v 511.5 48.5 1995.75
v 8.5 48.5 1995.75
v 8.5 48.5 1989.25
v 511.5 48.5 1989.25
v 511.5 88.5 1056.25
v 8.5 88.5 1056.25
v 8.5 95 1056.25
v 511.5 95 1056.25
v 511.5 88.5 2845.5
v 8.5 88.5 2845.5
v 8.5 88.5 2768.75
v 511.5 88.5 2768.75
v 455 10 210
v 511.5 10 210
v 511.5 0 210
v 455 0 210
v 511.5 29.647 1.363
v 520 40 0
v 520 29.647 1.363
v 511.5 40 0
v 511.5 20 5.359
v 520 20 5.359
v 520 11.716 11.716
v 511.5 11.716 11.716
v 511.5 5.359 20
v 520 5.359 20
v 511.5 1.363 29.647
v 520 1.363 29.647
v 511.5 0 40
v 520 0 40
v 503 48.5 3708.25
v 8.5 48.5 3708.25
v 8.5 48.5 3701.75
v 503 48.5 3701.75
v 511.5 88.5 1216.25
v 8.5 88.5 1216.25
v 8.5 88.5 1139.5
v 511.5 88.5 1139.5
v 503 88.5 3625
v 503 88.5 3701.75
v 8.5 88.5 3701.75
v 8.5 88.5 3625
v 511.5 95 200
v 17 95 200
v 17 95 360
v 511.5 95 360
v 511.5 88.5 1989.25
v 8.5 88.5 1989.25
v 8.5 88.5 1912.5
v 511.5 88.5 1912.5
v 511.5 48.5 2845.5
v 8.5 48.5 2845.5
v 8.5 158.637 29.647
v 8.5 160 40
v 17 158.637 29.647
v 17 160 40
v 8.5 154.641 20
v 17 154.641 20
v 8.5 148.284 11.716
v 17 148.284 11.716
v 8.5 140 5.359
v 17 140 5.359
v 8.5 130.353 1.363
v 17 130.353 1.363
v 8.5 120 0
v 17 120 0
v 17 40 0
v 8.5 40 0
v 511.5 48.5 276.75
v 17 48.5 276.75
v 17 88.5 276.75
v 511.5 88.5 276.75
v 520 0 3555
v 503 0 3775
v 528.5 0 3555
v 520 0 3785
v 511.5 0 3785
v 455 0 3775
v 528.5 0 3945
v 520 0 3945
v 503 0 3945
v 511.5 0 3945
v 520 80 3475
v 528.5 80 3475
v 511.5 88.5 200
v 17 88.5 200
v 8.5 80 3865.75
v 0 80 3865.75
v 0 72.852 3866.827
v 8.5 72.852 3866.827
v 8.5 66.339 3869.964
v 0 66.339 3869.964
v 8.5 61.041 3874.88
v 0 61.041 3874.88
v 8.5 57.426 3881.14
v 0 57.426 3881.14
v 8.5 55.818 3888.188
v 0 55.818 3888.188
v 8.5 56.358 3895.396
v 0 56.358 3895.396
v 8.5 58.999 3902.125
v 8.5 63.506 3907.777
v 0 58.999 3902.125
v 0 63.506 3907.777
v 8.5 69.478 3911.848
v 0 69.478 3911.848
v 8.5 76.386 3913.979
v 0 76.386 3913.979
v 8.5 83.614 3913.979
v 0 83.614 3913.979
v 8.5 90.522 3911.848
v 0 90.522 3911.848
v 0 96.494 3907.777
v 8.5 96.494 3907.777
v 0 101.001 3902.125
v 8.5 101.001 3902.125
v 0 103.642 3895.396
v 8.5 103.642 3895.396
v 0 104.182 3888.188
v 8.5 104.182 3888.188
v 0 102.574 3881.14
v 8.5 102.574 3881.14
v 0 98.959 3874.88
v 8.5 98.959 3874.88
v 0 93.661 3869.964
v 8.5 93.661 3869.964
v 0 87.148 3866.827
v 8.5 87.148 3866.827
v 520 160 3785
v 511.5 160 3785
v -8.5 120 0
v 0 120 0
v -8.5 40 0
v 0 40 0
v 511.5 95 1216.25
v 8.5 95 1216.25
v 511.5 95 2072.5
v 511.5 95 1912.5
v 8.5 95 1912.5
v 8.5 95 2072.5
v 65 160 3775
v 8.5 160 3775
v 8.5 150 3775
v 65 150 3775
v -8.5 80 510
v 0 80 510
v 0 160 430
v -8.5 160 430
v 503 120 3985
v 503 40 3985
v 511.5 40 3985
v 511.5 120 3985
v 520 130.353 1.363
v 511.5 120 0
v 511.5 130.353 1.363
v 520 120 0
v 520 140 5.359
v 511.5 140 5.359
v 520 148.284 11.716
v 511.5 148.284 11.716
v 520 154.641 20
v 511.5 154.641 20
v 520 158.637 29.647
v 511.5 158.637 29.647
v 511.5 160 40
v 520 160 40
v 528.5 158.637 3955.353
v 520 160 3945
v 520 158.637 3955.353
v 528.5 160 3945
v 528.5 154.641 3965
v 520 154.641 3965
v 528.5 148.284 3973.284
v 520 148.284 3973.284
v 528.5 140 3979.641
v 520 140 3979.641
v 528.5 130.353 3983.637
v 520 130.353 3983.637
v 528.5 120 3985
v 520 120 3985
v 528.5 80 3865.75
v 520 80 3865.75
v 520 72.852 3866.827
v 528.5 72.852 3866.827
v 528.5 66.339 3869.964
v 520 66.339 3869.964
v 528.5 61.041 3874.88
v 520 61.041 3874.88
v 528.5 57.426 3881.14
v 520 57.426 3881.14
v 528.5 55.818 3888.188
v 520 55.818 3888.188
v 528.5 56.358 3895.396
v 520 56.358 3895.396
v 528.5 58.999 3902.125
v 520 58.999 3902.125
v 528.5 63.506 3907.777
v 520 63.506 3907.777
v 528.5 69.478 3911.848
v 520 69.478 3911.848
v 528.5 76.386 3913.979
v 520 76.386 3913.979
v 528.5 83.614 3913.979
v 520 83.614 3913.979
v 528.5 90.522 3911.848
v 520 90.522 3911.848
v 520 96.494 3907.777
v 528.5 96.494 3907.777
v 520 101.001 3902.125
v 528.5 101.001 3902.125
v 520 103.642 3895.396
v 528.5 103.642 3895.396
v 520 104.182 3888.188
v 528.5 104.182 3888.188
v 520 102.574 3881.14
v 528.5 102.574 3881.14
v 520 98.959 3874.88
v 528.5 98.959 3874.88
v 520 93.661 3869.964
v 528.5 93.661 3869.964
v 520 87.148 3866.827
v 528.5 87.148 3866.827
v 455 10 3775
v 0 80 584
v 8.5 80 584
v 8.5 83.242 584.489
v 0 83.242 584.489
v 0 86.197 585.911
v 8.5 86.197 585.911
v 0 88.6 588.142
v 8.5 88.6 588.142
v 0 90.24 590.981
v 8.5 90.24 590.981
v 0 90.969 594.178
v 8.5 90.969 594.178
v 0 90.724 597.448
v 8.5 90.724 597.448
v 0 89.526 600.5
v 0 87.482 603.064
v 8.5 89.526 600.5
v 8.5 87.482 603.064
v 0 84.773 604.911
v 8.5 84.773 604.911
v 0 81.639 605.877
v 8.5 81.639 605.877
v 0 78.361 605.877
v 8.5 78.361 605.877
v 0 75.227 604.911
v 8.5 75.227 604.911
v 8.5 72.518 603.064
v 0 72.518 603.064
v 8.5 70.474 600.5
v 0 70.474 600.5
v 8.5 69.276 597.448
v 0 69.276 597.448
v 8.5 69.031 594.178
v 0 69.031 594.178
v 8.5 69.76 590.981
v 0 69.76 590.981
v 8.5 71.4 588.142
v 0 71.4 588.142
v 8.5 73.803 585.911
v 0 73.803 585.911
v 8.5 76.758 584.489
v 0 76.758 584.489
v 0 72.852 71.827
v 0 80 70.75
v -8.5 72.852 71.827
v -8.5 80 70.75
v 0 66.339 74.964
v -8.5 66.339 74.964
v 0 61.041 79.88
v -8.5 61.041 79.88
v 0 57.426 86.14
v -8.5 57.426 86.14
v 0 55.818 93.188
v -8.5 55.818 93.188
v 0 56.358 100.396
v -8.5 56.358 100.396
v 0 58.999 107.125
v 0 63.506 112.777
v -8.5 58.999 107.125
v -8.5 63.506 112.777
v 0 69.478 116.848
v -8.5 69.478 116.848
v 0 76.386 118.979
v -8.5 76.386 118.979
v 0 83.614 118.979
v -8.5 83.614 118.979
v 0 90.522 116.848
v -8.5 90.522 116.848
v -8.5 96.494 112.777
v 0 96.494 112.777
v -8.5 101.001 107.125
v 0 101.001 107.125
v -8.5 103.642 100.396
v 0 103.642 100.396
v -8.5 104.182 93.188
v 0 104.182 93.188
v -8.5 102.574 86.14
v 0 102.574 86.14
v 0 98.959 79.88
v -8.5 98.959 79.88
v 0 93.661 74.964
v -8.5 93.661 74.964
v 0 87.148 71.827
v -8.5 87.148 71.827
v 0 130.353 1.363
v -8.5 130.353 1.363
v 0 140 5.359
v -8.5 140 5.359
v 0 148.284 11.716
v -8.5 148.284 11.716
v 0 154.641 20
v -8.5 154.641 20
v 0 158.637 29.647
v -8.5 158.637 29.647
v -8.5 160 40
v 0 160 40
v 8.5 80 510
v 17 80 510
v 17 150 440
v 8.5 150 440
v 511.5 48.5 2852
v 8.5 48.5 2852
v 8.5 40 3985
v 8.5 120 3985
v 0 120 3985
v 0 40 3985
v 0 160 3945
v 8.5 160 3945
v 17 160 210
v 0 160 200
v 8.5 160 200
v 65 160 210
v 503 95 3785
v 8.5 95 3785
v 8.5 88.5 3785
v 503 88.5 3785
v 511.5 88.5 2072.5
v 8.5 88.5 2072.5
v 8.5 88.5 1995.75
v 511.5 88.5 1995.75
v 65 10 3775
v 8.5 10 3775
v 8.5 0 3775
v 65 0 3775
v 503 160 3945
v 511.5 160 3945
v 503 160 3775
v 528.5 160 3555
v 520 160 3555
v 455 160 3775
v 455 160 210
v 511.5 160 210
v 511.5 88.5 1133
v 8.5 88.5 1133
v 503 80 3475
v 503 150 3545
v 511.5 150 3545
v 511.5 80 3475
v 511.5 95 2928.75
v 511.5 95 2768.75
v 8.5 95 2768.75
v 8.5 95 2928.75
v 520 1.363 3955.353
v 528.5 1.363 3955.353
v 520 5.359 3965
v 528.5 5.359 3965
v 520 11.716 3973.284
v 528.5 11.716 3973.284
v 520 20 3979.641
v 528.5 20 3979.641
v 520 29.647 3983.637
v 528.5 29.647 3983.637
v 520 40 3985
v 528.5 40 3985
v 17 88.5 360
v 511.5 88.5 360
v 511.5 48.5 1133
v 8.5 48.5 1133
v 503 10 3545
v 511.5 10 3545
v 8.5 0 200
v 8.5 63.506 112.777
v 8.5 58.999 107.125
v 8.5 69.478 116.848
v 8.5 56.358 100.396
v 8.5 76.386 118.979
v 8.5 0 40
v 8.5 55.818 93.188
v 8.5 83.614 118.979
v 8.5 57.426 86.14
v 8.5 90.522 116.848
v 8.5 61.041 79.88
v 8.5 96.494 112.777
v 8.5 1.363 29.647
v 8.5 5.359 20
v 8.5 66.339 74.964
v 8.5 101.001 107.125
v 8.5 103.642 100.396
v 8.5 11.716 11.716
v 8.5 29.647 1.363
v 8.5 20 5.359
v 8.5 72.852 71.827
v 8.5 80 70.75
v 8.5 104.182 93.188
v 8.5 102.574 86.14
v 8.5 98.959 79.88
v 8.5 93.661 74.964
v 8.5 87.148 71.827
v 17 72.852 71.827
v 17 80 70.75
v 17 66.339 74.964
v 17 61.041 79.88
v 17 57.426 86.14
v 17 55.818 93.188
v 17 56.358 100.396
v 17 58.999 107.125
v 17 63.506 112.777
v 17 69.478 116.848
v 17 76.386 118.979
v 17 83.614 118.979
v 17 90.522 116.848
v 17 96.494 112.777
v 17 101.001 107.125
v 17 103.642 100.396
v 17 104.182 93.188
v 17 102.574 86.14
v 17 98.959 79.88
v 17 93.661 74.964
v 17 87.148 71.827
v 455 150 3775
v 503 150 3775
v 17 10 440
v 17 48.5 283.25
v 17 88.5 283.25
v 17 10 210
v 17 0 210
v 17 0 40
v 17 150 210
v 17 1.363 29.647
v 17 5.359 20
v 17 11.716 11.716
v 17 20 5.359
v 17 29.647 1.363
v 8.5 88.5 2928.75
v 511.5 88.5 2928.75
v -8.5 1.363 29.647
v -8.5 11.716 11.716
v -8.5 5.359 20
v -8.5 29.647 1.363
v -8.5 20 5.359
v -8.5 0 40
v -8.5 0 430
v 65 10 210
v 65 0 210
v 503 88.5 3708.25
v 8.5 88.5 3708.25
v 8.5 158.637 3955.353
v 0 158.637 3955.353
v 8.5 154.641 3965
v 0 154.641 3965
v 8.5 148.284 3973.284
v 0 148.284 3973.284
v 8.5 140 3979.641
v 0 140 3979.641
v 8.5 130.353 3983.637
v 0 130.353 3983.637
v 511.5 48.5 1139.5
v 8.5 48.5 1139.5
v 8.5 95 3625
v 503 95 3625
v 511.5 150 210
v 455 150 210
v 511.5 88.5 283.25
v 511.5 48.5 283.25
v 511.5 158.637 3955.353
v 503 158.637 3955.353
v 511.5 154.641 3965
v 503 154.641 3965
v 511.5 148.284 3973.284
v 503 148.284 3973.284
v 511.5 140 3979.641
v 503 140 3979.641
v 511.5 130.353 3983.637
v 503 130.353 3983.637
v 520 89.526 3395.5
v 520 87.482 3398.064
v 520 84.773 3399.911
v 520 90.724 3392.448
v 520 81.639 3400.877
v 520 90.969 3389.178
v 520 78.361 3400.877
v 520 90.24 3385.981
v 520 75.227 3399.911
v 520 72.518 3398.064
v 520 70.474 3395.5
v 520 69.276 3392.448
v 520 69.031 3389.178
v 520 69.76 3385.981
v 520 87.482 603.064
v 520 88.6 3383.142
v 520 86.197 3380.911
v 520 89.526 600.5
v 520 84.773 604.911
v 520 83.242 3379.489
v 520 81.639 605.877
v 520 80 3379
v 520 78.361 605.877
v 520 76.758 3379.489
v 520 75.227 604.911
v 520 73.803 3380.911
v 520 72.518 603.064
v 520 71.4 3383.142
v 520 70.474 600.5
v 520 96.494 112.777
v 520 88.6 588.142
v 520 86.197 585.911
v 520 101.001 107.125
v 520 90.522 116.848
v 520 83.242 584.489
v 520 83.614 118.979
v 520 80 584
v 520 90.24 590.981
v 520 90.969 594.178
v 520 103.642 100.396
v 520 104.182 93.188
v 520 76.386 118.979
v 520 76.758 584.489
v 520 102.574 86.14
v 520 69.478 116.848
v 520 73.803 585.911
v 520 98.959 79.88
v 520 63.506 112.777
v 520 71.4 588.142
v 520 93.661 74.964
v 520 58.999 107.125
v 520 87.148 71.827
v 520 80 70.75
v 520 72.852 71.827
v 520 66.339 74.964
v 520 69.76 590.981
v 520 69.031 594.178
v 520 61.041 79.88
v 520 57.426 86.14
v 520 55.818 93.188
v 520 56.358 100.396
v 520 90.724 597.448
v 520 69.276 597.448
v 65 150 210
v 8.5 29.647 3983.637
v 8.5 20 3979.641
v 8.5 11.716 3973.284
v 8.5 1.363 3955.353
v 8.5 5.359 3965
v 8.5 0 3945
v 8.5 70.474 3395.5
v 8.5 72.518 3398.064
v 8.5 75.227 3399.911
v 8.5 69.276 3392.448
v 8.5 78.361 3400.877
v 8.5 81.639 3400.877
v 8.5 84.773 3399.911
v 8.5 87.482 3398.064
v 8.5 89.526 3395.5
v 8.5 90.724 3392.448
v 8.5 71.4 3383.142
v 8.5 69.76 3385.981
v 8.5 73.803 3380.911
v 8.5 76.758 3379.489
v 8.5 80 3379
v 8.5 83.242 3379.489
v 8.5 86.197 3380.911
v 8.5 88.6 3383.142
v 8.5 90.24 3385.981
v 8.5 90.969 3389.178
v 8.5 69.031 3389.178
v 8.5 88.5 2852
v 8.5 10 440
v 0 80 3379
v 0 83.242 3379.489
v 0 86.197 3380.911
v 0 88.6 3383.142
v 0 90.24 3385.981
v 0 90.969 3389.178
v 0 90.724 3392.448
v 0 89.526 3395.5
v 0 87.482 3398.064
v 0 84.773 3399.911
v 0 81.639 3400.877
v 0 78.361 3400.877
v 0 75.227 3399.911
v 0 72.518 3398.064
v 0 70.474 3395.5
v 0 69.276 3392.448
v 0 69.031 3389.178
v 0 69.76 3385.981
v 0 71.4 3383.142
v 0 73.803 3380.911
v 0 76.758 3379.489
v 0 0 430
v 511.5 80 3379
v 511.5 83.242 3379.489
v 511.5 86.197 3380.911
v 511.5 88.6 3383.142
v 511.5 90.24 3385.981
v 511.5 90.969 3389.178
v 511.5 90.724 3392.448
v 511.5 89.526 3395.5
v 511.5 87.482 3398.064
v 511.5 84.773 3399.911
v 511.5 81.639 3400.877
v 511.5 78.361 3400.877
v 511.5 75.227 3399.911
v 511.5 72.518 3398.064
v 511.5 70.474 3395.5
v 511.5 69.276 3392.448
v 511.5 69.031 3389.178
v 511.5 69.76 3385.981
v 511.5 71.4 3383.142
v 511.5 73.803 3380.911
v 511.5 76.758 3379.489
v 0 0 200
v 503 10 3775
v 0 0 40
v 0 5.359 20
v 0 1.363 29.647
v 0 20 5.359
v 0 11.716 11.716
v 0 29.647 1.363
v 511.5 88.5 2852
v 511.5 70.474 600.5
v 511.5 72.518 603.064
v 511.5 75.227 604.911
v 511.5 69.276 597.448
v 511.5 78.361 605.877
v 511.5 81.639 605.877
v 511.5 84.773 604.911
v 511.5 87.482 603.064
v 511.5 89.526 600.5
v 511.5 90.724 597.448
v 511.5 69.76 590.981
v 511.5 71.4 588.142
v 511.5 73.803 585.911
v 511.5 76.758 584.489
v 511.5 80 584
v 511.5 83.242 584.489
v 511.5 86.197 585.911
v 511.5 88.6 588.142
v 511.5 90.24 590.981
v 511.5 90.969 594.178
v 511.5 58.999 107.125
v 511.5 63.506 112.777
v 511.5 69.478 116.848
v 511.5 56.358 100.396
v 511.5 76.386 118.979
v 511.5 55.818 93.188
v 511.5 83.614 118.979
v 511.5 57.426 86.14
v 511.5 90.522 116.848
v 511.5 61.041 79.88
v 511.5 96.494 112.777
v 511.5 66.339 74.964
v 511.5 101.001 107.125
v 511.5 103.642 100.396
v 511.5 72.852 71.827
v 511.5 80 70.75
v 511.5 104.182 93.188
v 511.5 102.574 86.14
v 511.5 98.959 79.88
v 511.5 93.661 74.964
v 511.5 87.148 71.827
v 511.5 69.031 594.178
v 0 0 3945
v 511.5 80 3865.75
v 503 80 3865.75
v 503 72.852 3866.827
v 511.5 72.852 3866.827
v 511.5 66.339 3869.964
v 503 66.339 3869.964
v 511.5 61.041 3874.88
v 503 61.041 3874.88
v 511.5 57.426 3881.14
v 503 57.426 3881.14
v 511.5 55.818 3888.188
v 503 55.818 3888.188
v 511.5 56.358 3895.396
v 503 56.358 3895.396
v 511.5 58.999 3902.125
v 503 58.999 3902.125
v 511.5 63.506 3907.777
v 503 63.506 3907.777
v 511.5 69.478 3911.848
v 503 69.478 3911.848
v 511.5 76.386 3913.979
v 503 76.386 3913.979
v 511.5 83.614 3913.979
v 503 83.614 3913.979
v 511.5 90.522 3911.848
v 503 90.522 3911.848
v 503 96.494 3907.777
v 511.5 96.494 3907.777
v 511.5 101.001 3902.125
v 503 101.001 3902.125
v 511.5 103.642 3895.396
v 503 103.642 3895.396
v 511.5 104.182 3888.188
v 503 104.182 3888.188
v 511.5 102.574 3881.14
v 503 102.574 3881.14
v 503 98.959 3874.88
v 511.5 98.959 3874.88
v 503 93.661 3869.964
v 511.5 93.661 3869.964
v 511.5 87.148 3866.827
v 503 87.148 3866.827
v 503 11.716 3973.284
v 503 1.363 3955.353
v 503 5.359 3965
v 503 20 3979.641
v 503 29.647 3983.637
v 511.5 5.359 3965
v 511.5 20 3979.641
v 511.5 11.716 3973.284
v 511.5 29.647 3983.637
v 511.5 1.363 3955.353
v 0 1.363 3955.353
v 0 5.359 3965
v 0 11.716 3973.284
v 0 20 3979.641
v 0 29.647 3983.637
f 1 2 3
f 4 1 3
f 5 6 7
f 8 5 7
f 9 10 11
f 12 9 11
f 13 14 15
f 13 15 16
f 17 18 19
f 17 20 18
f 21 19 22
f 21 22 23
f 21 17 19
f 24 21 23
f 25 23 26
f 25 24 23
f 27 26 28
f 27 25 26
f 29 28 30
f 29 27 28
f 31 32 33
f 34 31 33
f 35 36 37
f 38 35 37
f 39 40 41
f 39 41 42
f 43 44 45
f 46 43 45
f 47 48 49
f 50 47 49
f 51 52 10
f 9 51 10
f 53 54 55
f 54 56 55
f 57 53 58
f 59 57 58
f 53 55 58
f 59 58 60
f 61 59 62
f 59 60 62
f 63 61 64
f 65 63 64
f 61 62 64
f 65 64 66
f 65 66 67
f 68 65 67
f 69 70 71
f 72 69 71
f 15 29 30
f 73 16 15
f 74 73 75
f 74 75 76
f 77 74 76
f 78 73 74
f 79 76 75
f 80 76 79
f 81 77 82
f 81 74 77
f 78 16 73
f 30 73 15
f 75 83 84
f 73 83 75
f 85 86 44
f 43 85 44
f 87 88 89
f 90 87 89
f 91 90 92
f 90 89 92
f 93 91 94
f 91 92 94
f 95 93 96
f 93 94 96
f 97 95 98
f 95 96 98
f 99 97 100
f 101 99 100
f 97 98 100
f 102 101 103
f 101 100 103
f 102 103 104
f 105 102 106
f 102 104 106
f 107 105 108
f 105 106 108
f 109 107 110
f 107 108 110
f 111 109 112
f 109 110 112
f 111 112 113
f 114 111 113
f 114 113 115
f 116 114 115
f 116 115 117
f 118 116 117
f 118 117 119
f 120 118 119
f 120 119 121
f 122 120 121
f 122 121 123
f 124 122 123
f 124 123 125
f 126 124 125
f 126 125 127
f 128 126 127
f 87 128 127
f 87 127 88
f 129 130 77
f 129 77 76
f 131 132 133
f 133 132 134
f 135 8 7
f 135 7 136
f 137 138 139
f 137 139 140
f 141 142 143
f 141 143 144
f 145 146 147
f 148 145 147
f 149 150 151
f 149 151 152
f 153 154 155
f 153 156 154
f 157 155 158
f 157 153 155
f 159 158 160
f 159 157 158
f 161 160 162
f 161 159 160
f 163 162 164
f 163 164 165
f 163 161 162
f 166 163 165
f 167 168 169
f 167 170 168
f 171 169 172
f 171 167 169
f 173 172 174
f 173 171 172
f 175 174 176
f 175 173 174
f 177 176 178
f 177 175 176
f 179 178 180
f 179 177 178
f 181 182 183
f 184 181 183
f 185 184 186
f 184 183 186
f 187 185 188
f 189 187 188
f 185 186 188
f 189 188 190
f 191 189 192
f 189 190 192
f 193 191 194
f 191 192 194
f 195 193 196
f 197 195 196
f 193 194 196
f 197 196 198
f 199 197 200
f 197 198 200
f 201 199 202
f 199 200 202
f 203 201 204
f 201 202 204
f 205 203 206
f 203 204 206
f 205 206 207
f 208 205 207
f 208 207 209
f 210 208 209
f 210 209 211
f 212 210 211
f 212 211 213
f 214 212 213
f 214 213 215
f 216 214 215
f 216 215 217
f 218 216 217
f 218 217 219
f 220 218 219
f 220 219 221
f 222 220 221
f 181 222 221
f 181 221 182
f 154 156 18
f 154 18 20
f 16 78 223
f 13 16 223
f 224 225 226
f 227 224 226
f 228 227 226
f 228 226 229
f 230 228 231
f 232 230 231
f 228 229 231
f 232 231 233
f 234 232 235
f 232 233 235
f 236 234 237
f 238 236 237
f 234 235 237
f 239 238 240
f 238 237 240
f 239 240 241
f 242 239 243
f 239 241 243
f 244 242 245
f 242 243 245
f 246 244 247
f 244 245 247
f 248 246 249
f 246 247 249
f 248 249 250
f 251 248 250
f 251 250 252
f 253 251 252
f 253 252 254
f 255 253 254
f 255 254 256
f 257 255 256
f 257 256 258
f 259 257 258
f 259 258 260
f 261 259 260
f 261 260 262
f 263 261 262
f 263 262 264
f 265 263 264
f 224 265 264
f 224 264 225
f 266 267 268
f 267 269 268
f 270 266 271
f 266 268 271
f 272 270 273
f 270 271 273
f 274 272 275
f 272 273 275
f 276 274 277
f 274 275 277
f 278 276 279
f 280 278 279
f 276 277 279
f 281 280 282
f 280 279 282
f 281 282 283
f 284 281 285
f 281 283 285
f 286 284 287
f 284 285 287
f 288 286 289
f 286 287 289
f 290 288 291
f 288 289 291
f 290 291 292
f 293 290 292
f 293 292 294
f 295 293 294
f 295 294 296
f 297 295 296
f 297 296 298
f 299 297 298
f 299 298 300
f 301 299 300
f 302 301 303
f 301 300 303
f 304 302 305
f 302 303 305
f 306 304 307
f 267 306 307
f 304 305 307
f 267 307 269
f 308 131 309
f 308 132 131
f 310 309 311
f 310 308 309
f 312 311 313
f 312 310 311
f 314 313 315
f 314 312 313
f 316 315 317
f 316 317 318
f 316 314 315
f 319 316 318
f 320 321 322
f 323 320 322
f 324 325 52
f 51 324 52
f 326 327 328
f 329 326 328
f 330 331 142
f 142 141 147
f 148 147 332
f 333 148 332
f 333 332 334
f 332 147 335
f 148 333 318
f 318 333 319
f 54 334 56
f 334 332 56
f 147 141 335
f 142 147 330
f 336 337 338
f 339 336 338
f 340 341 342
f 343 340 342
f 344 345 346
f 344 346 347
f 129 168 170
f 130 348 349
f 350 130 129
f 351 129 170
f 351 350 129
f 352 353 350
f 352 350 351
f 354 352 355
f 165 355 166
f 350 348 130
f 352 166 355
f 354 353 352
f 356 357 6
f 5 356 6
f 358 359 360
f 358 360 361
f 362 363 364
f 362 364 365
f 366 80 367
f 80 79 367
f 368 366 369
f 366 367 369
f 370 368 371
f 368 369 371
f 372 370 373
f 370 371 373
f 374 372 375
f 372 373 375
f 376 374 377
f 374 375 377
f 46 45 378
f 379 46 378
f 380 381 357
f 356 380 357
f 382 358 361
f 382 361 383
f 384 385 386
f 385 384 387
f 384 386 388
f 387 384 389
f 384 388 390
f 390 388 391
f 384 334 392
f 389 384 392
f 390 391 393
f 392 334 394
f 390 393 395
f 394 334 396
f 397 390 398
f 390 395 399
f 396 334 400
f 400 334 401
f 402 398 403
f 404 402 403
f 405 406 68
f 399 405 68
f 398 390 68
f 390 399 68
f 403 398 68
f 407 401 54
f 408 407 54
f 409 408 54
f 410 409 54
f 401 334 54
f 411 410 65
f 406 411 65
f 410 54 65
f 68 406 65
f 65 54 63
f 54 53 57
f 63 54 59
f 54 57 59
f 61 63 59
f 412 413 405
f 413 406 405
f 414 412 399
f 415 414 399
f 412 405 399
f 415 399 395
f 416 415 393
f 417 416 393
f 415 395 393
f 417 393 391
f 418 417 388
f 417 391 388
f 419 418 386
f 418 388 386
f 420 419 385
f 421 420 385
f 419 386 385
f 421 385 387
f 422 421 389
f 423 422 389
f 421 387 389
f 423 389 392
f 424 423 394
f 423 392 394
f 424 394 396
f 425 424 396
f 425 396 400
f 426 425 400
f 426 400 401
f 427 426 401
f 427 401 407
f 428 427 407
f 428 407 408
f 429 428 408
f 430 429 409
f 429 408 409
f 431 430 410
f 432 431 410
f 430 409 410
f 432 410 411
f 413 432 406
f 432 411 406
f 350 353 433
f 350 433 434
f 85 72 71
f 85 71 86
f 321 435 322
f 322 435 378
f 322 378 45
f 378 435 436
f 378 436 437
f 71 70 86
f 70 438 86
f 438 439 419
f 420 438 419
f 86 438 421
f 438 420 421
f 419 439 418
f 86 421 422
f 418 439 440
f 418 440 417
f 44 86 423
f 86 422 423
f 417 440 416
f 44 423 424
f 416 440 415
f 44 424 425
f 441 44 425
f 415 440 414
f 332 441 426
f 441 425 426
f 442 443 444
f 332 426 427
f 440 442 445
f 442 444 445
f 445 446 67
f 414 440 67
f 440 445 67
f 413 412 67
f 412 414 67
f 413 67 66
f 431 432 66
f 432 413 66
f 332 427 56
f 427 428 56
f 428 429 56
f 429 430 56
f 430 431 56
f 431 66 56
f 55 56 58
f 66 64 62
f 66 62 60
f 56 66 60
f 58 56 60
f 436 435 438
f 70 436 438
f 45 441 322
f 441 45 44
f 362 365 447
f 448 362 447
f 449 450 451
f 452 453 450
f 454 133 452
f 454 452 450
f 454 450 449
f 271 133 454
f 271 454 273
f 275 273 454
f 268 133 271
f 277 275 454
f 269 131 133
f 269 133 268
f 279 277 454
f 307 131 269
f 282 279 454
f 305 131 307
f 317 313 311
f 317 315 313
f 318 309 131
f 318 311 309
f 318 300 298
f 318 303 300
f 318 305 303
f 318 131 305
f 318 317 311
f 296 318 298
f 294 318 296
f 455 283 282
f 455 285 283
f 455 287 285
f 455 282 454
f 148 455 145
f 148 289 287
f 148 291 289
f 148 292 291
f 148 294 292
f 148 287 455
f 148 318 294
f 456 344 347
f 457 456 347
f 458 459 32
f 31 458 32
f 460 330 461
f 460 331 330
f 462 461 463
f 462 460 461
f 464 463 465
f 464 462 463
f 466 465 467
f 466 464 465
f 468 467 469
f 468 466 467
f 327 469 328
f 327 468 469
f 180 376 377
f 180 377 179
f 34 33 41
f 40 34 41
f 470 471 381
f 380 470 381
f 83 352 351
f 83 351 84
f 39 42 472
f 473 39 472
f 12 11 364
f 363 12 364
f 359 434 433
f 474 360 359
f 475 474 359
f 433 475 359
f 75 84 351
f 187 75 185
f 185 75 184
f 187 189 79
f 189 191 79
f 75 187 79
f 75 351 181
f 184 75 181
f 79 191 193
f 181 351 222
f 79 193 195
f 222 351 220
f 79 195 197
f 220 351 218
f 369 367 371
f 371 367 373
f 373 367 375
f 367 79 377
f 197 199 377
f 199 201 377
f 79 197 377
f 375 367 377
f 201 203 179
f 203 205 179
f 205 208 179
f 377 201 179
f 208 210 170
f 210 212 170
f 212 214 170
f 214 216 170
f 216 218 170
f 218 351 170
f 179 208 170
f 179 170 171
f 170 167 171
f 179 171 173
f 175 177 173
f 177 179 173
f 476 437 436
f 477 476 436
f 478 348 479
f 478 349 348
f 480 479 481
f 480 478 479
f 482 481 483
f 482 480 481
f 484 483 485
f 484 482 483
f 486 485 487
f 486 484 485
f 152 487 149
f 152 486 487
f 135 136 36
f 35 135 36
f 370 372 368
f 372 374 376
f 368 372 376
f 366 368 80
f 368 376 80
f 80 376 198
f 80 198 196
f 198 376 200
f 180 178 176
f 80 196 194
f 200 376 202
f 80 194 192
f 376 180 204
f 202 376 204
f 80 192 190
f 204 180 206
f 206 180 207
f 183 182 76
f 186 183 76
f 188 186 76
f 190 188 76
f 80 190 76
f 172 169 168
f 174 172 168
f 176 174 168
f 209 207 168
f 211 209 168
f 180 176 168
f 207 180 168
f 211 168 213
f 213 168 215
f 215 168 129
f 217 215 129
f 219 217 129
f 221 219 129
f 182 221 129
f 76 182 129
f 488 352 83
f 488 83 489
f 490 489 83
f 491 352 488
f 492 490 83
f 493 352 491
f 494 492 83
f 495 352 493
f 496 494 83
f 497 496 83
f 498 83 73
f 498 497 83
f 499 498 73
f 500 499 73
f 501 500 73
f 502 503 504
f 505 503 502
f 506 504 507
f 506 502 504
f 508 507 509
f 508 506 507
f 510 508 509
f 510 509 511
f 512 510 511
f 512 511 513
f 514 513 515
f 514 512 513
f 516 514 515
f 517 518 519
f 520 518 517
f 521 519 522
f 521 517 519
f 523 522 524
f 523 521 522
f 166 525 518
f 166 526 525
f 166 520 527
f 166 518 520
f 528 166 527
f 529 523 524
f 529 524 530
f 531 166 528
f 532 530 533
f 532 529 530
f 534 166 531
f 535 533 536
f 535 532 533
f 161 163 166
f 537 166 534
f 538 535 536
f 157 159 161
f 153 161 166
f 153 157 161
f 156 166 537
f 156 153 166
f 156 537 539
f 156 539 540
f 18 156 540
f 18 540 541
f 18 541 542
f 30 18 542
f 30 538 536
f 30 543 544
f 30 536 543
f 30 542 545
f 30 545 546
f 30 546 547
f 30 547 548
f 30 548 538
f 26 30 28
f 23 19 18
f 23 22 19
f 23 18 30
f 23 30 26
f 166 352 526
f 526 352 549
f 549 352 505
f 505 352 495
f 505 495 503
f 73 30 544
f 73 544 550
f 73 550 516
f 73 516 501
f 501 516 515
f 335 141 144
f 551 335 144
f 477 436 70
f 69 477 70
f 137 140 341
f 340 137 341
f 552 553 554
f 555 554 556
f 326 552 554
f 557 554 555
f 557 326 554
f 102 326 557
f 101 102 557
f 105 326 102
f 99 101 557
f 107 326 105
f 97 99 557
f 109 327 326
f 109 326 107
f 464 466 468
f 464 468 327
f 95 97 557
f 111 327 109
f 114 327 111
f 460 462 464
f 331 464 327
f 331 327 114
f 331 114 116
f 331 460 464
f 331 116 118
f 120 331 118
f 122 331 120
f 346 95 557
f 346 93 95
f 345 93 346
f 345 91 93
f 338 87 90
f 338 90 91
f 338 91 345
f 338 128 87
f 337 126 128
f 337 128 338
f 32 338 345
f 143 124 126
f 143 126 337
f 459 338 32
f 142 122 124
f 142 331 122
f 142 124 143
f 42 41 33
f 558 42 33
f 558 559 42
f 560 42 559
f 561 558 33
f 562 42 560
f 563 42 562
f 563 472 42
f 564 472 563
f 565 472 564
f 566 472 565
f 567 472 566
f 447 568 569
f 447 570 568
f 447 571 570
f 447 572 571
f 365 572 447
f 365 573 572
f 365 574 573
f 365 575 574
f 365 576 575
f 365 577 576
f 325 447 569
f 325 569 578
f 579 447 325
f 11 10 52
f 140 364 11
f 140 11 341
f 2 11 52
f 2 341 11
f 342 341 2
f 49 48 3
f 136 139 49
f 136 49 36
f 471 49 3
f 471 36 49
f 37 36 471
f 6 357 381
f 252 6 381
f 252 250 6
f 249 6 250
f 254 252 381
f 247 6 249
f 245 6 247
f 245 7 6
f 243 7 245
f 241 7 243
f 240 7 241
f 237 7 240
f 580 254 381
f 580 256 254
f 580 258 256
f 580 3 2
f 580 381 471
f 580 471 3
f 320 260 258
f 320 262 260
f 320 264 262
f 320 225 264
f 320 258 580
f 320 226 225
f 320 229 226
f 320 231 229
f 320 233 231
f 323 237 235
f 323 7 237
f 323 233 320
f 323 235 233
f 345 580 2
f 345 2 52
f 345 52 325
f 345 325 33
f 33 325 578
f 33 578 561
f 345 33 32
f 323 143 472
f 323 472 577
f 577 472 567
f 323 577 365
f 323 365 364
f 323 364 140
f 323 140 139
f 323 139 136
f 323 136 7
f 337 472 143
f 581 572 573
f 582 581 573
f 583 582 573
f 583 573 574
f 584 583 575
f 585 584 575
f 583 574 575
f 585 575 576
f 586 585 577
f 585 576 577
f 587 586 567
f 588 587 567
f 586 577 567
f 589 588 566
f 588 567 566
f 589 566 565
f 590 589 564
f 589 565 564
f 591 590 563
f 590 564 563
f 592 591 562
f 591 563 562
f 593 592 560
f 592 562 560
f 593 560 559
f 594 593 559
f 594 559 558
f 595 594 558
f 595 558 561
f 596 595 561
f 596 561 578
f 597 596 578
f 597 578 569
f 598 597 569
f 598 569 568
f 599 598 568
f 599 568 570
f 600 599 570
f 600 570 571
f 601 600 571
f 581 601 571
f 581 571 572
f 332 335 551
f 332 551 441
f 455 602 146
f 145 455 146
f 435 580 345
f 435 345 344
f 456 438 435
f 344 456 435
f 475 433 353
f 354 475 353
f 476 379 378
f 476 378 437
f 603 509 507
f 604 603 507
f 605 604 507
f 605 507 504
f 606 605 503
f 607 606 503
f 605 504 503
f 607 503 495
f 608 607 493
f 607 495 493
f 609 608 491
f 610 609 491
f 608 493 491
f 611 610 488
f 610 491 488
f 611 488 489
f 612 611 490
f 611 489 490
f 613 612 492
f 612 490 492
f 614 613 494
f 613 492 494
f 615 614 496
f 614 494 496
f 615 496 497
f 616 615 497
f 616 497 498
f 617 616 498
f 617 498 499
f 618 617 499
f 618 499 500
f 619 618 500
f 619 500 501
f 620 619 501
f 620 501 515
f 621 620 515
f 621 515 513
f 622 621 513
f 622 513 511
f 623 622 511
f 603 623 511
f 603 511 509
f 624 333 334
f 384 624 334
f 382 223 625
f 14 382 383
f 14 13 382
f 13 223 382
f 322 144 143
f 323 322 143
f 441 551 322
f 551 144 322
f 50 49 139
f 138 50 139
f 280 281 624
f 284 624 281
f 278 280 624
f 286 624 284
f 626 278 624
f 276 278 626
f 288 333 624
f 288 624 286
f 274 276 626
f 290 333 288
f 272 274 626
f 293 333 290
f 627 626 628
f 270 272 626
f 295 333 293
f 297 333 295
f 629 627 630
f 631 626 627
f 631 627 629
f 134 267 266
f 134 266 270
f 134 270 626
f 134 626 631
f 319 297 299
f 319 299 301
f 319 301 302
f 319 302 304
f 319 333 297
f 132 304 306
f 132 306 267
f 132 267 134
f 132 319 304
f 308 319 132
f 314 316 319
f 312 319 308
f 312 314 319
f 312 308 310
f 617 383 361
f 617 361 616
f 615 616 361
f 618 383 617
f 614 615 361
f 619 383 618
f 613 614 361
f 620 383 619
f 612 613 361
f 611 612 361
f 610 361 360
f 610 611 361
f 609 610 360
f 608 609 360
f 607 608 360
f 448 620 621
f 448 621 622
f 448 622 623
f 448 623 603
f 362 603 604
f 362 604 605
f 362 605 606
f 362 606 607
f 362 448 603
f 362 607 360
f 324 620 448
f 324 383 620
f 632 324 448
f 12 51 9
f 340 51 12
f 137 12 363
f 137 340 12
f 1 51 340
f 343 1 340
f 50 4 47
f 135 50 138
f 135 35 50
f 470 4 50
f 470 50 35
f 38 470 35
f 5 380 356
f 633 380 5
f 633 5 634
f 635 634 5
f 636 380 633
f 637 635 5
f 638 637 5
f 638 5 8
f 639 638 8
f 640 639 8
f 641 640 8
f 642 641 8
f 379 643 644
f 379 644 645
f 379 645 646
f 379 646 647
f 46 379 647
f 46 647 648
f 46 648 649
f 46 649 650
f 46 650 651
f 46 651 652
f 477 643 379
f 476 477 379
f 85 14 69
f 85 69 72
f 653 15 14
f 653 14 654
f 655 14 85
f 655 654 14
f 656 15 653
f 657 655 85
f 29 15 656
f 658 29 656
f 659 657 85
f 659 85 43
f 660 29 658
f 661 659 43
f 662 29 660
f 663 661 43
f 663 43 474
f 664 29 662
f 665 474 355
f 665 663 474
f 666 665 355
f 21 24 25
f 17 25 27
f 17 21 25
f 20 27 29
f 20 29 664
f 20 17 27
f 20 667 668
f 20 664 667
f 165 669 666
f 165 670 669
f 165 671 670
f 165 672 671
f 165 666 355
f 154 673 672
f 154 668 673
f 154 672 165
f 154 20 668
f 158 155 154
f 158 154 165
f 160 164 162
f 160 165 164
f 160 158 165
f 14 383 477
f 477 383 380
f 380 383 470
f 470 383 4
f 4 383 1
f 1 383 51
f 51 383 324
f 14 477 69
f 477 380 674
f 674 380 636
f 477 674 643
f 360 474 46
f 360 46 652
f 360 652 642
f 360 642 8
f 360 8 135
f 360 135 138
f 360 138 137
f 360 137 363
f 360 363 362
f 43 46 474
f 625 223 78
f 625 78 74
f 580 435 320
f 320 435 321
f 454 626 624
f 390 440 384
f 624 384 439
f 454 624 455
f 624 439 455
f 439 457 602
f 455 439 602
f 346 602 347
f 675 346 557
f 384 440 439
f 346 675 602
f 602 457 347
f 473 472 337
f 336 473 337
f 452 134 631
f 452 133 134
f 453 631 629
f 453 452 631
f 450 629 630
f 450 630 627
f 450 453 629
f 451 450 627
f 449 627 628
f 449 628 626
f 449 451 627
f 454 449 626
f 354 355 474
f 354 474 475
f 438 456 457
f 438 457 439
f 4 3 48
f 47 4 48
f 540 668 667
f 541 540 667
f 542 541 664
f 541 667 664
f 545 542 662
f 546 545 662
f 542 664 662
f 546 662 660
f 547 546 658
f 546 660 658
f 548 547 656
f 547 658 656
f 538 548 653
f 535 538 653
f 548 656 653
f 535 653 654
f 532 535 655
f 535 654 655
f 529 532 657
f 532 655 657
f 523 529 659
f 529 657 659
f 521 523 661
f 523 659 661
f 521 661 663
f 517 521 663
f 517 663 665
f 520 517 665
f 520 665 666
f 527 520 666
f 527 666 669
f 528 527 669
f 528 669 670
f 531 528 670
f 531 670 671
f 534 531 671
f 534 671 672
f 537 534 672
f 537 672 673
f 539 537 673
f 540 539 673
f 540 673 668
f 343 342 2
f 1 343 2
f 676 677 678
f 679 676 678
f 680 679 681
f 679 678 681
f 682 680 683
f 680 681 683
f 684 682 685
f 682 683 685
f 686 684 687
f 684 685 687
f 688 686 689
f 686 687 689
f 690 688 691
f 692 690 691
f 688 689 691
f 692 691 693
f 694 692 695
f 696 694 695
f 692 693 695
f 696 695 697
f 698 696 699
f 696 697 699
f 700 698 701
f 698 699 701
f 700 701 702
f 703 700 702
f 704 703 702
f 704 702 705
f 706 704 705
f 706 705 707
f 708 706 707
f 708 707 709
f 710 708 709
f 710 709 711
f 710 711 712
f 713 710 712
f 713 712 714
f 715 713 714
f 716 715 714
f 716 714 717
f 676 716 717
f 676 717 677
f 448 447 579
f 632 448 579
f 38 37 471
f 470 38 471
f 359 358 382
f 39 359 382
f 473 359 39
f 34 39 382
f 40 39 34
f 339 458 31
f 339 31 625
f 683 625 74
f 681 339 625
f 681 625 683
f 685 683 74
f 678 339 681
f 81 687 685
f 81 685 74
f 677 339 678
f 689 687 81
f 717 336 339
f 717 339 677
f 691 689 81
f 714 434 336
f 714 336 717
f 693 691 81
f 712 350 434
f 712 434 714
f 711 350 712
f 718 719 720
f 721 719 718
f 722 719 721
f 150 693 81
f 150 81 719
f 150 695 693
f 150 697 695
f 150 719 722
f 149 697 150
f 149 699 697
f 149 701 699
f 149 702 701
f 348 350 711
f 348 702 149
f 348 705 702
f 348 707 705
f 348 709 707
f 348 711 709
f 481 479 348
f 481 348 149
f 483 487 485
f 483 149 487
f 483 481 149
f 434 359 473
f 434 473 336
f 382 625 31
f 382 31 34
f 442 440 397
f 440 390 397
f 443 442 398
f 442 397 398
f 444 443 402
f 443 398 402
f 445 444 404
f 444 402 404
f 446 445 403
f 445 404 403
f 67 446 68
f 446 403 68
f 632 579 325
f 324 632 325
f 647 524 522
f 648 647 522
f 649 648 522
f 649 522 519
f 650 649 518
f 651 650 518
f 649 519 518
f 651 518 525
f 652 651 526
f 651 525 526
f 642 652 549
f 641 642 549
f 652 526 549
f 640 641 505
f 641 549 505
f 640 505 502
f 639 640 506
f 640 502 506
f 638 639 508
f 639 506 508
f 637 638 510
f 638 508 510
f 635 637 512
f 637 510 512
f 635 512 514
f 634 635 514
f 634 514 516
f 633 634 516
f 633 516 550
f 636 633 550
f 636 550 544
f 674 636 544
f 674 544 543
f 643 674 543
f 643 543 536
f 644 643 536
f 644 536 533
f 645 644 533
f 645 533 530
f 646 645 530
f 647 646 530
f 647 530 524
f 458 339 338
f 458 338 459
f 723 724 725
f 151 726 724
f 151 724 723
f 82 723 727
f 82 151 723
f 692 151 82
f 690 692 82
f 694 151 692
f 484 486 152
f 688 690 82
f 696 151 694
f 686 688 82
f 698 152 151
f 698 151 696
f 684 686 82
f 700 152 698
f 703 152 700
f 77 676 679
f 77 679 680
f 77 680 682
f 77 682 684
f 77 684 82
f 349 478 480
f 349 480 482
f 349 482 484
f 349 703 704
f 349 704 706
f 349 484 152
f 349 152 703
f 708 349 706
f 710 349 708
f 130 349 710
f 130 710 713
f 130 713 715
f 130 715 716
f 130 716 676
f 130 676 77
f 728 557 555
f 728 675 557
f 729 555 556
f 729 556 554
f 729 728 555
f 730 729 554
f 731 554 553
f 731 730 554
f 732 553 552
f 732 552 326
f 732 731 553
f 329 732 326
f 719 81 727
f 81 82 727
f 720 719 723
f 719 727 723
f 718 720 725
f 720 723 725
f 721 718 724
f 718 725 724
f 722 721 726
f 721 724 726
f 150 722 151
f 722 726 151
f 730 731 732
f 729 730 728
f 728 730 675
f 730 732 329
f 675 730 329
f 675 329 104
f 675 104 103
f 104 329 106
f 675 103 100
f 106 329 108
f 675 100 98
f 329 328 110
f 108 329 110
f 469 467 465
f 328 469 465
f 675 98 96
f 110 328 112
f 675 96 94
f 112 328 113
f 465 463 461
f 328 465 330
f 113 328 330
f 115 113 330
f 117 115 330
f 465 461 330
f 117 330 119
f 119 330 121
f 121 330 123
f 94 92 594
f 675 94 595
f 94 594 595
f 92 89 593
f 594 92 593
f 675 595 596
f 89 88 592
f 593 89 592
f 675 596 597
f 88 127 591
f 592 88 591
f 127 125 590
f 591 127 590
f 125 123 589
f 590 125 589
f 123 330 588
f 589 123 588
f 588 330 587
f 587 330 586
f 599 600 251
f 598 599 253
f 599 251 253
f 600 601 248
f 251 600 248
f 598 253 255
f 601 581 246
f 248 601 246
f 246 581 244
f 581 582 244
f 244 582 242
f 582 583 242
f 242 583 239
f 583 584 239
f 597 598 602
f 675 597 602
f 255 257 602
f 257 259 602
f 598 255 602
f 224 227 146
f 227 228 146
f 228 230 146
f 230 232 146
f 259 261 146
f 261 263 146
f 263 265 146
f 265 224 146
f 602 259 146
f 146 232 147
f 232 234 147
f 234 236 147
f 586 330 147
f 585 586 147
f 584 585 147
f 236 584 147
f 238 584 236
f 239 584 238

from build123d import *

# Parameters (mm, degrees)
EXTRUDE_1_DEPTH        = 3985
EXTRUDE_1_2_DEPTH      = 3985
EXTRUDE_3_DEPTH        = 520
SKETCH_6_W             = 503
SKETCH_6_H             = 200
CUT_EXTRUDE_4_DEPTH    = 4022.96780196
PATTERN_LINEAR_1_COUNT = 5
PATTERN_LINEAR_1_PITCH = 856.25
EXTRUDE_11_DEPTH       = 8.5
PATTERN_LINEAR_2_COUNT = 2
PATTERN_LINEAR_2_PITCH = 17
SKETCH_22_W            = 8.5
SKETCH_22_H            = 200
CUT_EXTRUDE_12_DEPTH   = 4024.075595859
SKETCH_23_R            = 24.25
CUT_EXTRUDE_13_DEPTH   = 4024.075595859
EXTRUDE_14_DEPTH       = 8.5
PATTERN_LINEAR_3_COUNT = 2
PATTERN_LINEAR_3_PITCH = 17
SKETCH_27_W            = 8.5
SKETCH_27_H            = 200
CUT_EXTRUDE_15_DEPTH   = 4024.075595859
SKETCH_28_R            = 24.25
CUT_EXTRUDE_16_DEPTH   = 4025.201038716
FILLET_2_R             = 40
SKETCH_29_W            = 494.5
SKETCH_29_H            = 10
CUT_EXTRUDE_17_DEPTH   = 10
SKETCH_30_W            = 494.5
SKETCH_30_H            = 10
CUT_EXTRUDE_18_DEPTH   = 10
SKETCH_31_R            = 11
CUT_EXTRUDE_19_DEPTH   = 4024.075595859


with BuildPart() as part:
    # 草图2 → 拉伸1 (new body)
    with BuildSketch(Plane.XY):
        Polygon((0, 0), (0, 160), (65, 160), (65, 150), (8.5, 150), (8.5, 10), (65, 10), (65, 0), align=None)
    extrude(amount=EXTRUDE_1_DEPTH)



with BuildPart() as body_2:
    # 草图2 → Extrude 1 2 (new body)
    with BuildSketch(Plane.XY):
        Polygon((455, 160), (520, 160), (520, 0), (455, 0), (455, 10), (511.5, 10), (511.5, 150), (455, 150), align=None)
    extrude(amount=EXTRUDE_1_2_DEPTH)


with BuildPart() as part_1:
    add(part.part)

    add(body_2.part)  # 拉伸3 merges body 2
    # 草图5 → 拉伸3 (add)
    with BuildSketch(Plane.ZY):
        Polygon((200, 95), (360, 95), (360, 88.5), (283.25, 88.5), (283.25, 48.5), (276.75, 48.5), (276.75, 88.5), (200, 88.5), align=None)
    extrude_3 = extrude(amount=-EXTRUDE_3_DEPTH)

    # 草图6 → 拉伸4 (cut, through all)
    with BuildSketch(Plane(origin=(0, 160, 0), x_dir=(1, 0, 0), z_dir=(0, 1, 0))):
        with Locations((260, -100)):
            Rectangle(SKETCH_6_W, SKETCH_6_H)
        with Locations((260, -3885)):
            Rectangle(SKETCH_6_W, SKETCH_6_H)
    extrude(amount=-CUT_EXTRUDE_4_DEPTH, mode=Mode.SUBTRACT)

    # 阵列(线性)1: 拉伸3 ×5
    with Locations(*[(0, 0, i * PATTERN_LINEAR_1_PITCH) for i in range(1, PATTERN_LINEAR_1_COUNT)]):
        add(extrude_3)

    # 草图19 → 拉伸11 (add)
    with BuildSketch(Plane(origin=(520, 0, 0), x_dir=(0, 0, -1), z_dir=(1, 0, 0))):
        Polygon((-3985, 160), (-3555, 160), (-3475, 80), (-3555, 0), (-3985, 0), align=None)
    extrude_11 = extrude(amount=EXTRUDE_11_DEPTH)

    # 阵列(线性)2: 拉伸11 ×2
    with Locations(*[(-i * PATTERN_LINEAR_2_PITCH, 0, 0) for i in range(1, PATTERN_LINEAR_2_COUNT)]):
        add(extrude_11)

    # 草图22 → 拉伸12 (cut, through all)
    with BuildSketch(Plane(origin=(0, 160, 0), x_dir=(1, 0, 0), z_dir=(0, 1, 0))):
        with Locations((515.75, -3885)):
            Rectangle(SKETCH_22_W, SKETCH_22_H)
    extrude(amount=-CUT_EXTRUDE_12_DEPTH, mode=Mode.SUBTRACT)

    # 草图23 → 拉伸13 (cut, through all)
    with BuildSketch(Plane.ZY):
        with Locations(Location((95, 80, 0), (0, 0, 180))):
            Circle(SKETCH_23_R)
        with Locations(Location((3890, 80, 0), (0, 0, 180))):
            Circle(SKETCH_23_R)
    extrude(amount=-CUT_EXTRUDE_13_DEPTH, mode=Mode.SUBTRACT)

    # 草图26 → 拉伸14 (add)
    with BuildSketch(Plane.ZY):
        Polygon((0, 160), (0, 0), (430, 0), (510, 80), (430, 160), align=None)
    extrude_14 = extrude(amount=EXTRUDE_14_DEPTH)

    # 阵列(线性)3: 拉伸14 ×2
    with Locations(*[(i * PATTERN_LINEAR_3_PITCH, 0, 0) for i in range(1, PATTERN_LINEAR_3_COUNT)]):
        add(extrude_14)

    # 草图27 → 拉伸15 (cut, through all)
    with BuildSketch(Plane(origin=(0, 160, 0), x_dir=(1, 0, 0), z_dir=(0, 1, 0))):
        with Locations((4.25, -100)):
            Rectangle(SKETCH_27_W, SKETCH_27_H)
    extrude(amount=-CUT_EXTRUDE_15_DEPTH, mode=Mode.SUBTRACT)

    # 草图28 → 拉伸16 (cut, through all)
    with BuildSketch(Plane.ZY.offset(8.5)):
        with Locations(Location((95, 80, 0), (0, 0, 180))):
            Circle(SKETCH_28_R)
    extrude(amount=-CUT_EXTRUDE_16_DEPTH, mode=Mode.SUBTRACT)

    # 圆角2
    fillet_2_edges = [part_1.edges().sort_by_distance(p)[0] for p in [
        (-4.25, 0, 0),
        (507.25, 0, 3985),
        (4.25, 160, 3985),
        (4.25, 0, 3985),
        (507.25, 160, 3985),
        (524.25, 0, 3985),
        (-4.25, 160, 0),
        (12.75, 0, 0),
        (515.75, 160, 0),
        (524.25, 160, 3985),
        (515.75, 0, 0),
        (12.75, 160, 0),
    ]]
    fillet(fillet_2_edges, radius=FILLET_2_R)

    # 草图29 → 拉伸17 (cut)
    with BuildSketch(Plane.XY.offset(3785)):
        with Locations((255.75, 155)):
            Rectangle(SKETCH_29_W, SKETCH_29_H)
        with Locations((255.75, 5)):
            Rectangle(SKETCH_29_W, SKETCH_29_H)
    extrude(amount=-CUT_EXTRUDE_17_DEPTH, mode=Mode.SUBTRACT)

    # 草图30 → 拉伸18 (cut)
    with BuildSketch(Plane(origin=(0, 0, 200), x_dir=(-1, 0, 0), z_dir=(0, 0, -1))):
        with Locations((-264.25, 155)):
            Rectangle(SKETCH_30_W, SKETCH_30_H)
        with Locations((-264.25, 5)):
            Rectangle(SKETCH_30_W, SKETCH_30_H)
    extrude(amount=-CUT_EXTRUDE_18_DEPTH, mode=Mode.SUBTRACT)

    # 草图31 → 拉伸19 (cut, through all)
    with BuildSketch(Plane(origin=(520, 0, 0), x_dir=(0, 0, -1), z_dir=(1, 0, 0))):
        with Locations((-595, 80)):
            Circle(SKETCH_31_R)
        with Locations((-3390, 80)):
            Circle(SKETCH_31_R)
    extrude(amount=-CUT_EXTRUDE_19_DEPTH, mode=Mode.SUBTRACT)


solid = part_1.part
